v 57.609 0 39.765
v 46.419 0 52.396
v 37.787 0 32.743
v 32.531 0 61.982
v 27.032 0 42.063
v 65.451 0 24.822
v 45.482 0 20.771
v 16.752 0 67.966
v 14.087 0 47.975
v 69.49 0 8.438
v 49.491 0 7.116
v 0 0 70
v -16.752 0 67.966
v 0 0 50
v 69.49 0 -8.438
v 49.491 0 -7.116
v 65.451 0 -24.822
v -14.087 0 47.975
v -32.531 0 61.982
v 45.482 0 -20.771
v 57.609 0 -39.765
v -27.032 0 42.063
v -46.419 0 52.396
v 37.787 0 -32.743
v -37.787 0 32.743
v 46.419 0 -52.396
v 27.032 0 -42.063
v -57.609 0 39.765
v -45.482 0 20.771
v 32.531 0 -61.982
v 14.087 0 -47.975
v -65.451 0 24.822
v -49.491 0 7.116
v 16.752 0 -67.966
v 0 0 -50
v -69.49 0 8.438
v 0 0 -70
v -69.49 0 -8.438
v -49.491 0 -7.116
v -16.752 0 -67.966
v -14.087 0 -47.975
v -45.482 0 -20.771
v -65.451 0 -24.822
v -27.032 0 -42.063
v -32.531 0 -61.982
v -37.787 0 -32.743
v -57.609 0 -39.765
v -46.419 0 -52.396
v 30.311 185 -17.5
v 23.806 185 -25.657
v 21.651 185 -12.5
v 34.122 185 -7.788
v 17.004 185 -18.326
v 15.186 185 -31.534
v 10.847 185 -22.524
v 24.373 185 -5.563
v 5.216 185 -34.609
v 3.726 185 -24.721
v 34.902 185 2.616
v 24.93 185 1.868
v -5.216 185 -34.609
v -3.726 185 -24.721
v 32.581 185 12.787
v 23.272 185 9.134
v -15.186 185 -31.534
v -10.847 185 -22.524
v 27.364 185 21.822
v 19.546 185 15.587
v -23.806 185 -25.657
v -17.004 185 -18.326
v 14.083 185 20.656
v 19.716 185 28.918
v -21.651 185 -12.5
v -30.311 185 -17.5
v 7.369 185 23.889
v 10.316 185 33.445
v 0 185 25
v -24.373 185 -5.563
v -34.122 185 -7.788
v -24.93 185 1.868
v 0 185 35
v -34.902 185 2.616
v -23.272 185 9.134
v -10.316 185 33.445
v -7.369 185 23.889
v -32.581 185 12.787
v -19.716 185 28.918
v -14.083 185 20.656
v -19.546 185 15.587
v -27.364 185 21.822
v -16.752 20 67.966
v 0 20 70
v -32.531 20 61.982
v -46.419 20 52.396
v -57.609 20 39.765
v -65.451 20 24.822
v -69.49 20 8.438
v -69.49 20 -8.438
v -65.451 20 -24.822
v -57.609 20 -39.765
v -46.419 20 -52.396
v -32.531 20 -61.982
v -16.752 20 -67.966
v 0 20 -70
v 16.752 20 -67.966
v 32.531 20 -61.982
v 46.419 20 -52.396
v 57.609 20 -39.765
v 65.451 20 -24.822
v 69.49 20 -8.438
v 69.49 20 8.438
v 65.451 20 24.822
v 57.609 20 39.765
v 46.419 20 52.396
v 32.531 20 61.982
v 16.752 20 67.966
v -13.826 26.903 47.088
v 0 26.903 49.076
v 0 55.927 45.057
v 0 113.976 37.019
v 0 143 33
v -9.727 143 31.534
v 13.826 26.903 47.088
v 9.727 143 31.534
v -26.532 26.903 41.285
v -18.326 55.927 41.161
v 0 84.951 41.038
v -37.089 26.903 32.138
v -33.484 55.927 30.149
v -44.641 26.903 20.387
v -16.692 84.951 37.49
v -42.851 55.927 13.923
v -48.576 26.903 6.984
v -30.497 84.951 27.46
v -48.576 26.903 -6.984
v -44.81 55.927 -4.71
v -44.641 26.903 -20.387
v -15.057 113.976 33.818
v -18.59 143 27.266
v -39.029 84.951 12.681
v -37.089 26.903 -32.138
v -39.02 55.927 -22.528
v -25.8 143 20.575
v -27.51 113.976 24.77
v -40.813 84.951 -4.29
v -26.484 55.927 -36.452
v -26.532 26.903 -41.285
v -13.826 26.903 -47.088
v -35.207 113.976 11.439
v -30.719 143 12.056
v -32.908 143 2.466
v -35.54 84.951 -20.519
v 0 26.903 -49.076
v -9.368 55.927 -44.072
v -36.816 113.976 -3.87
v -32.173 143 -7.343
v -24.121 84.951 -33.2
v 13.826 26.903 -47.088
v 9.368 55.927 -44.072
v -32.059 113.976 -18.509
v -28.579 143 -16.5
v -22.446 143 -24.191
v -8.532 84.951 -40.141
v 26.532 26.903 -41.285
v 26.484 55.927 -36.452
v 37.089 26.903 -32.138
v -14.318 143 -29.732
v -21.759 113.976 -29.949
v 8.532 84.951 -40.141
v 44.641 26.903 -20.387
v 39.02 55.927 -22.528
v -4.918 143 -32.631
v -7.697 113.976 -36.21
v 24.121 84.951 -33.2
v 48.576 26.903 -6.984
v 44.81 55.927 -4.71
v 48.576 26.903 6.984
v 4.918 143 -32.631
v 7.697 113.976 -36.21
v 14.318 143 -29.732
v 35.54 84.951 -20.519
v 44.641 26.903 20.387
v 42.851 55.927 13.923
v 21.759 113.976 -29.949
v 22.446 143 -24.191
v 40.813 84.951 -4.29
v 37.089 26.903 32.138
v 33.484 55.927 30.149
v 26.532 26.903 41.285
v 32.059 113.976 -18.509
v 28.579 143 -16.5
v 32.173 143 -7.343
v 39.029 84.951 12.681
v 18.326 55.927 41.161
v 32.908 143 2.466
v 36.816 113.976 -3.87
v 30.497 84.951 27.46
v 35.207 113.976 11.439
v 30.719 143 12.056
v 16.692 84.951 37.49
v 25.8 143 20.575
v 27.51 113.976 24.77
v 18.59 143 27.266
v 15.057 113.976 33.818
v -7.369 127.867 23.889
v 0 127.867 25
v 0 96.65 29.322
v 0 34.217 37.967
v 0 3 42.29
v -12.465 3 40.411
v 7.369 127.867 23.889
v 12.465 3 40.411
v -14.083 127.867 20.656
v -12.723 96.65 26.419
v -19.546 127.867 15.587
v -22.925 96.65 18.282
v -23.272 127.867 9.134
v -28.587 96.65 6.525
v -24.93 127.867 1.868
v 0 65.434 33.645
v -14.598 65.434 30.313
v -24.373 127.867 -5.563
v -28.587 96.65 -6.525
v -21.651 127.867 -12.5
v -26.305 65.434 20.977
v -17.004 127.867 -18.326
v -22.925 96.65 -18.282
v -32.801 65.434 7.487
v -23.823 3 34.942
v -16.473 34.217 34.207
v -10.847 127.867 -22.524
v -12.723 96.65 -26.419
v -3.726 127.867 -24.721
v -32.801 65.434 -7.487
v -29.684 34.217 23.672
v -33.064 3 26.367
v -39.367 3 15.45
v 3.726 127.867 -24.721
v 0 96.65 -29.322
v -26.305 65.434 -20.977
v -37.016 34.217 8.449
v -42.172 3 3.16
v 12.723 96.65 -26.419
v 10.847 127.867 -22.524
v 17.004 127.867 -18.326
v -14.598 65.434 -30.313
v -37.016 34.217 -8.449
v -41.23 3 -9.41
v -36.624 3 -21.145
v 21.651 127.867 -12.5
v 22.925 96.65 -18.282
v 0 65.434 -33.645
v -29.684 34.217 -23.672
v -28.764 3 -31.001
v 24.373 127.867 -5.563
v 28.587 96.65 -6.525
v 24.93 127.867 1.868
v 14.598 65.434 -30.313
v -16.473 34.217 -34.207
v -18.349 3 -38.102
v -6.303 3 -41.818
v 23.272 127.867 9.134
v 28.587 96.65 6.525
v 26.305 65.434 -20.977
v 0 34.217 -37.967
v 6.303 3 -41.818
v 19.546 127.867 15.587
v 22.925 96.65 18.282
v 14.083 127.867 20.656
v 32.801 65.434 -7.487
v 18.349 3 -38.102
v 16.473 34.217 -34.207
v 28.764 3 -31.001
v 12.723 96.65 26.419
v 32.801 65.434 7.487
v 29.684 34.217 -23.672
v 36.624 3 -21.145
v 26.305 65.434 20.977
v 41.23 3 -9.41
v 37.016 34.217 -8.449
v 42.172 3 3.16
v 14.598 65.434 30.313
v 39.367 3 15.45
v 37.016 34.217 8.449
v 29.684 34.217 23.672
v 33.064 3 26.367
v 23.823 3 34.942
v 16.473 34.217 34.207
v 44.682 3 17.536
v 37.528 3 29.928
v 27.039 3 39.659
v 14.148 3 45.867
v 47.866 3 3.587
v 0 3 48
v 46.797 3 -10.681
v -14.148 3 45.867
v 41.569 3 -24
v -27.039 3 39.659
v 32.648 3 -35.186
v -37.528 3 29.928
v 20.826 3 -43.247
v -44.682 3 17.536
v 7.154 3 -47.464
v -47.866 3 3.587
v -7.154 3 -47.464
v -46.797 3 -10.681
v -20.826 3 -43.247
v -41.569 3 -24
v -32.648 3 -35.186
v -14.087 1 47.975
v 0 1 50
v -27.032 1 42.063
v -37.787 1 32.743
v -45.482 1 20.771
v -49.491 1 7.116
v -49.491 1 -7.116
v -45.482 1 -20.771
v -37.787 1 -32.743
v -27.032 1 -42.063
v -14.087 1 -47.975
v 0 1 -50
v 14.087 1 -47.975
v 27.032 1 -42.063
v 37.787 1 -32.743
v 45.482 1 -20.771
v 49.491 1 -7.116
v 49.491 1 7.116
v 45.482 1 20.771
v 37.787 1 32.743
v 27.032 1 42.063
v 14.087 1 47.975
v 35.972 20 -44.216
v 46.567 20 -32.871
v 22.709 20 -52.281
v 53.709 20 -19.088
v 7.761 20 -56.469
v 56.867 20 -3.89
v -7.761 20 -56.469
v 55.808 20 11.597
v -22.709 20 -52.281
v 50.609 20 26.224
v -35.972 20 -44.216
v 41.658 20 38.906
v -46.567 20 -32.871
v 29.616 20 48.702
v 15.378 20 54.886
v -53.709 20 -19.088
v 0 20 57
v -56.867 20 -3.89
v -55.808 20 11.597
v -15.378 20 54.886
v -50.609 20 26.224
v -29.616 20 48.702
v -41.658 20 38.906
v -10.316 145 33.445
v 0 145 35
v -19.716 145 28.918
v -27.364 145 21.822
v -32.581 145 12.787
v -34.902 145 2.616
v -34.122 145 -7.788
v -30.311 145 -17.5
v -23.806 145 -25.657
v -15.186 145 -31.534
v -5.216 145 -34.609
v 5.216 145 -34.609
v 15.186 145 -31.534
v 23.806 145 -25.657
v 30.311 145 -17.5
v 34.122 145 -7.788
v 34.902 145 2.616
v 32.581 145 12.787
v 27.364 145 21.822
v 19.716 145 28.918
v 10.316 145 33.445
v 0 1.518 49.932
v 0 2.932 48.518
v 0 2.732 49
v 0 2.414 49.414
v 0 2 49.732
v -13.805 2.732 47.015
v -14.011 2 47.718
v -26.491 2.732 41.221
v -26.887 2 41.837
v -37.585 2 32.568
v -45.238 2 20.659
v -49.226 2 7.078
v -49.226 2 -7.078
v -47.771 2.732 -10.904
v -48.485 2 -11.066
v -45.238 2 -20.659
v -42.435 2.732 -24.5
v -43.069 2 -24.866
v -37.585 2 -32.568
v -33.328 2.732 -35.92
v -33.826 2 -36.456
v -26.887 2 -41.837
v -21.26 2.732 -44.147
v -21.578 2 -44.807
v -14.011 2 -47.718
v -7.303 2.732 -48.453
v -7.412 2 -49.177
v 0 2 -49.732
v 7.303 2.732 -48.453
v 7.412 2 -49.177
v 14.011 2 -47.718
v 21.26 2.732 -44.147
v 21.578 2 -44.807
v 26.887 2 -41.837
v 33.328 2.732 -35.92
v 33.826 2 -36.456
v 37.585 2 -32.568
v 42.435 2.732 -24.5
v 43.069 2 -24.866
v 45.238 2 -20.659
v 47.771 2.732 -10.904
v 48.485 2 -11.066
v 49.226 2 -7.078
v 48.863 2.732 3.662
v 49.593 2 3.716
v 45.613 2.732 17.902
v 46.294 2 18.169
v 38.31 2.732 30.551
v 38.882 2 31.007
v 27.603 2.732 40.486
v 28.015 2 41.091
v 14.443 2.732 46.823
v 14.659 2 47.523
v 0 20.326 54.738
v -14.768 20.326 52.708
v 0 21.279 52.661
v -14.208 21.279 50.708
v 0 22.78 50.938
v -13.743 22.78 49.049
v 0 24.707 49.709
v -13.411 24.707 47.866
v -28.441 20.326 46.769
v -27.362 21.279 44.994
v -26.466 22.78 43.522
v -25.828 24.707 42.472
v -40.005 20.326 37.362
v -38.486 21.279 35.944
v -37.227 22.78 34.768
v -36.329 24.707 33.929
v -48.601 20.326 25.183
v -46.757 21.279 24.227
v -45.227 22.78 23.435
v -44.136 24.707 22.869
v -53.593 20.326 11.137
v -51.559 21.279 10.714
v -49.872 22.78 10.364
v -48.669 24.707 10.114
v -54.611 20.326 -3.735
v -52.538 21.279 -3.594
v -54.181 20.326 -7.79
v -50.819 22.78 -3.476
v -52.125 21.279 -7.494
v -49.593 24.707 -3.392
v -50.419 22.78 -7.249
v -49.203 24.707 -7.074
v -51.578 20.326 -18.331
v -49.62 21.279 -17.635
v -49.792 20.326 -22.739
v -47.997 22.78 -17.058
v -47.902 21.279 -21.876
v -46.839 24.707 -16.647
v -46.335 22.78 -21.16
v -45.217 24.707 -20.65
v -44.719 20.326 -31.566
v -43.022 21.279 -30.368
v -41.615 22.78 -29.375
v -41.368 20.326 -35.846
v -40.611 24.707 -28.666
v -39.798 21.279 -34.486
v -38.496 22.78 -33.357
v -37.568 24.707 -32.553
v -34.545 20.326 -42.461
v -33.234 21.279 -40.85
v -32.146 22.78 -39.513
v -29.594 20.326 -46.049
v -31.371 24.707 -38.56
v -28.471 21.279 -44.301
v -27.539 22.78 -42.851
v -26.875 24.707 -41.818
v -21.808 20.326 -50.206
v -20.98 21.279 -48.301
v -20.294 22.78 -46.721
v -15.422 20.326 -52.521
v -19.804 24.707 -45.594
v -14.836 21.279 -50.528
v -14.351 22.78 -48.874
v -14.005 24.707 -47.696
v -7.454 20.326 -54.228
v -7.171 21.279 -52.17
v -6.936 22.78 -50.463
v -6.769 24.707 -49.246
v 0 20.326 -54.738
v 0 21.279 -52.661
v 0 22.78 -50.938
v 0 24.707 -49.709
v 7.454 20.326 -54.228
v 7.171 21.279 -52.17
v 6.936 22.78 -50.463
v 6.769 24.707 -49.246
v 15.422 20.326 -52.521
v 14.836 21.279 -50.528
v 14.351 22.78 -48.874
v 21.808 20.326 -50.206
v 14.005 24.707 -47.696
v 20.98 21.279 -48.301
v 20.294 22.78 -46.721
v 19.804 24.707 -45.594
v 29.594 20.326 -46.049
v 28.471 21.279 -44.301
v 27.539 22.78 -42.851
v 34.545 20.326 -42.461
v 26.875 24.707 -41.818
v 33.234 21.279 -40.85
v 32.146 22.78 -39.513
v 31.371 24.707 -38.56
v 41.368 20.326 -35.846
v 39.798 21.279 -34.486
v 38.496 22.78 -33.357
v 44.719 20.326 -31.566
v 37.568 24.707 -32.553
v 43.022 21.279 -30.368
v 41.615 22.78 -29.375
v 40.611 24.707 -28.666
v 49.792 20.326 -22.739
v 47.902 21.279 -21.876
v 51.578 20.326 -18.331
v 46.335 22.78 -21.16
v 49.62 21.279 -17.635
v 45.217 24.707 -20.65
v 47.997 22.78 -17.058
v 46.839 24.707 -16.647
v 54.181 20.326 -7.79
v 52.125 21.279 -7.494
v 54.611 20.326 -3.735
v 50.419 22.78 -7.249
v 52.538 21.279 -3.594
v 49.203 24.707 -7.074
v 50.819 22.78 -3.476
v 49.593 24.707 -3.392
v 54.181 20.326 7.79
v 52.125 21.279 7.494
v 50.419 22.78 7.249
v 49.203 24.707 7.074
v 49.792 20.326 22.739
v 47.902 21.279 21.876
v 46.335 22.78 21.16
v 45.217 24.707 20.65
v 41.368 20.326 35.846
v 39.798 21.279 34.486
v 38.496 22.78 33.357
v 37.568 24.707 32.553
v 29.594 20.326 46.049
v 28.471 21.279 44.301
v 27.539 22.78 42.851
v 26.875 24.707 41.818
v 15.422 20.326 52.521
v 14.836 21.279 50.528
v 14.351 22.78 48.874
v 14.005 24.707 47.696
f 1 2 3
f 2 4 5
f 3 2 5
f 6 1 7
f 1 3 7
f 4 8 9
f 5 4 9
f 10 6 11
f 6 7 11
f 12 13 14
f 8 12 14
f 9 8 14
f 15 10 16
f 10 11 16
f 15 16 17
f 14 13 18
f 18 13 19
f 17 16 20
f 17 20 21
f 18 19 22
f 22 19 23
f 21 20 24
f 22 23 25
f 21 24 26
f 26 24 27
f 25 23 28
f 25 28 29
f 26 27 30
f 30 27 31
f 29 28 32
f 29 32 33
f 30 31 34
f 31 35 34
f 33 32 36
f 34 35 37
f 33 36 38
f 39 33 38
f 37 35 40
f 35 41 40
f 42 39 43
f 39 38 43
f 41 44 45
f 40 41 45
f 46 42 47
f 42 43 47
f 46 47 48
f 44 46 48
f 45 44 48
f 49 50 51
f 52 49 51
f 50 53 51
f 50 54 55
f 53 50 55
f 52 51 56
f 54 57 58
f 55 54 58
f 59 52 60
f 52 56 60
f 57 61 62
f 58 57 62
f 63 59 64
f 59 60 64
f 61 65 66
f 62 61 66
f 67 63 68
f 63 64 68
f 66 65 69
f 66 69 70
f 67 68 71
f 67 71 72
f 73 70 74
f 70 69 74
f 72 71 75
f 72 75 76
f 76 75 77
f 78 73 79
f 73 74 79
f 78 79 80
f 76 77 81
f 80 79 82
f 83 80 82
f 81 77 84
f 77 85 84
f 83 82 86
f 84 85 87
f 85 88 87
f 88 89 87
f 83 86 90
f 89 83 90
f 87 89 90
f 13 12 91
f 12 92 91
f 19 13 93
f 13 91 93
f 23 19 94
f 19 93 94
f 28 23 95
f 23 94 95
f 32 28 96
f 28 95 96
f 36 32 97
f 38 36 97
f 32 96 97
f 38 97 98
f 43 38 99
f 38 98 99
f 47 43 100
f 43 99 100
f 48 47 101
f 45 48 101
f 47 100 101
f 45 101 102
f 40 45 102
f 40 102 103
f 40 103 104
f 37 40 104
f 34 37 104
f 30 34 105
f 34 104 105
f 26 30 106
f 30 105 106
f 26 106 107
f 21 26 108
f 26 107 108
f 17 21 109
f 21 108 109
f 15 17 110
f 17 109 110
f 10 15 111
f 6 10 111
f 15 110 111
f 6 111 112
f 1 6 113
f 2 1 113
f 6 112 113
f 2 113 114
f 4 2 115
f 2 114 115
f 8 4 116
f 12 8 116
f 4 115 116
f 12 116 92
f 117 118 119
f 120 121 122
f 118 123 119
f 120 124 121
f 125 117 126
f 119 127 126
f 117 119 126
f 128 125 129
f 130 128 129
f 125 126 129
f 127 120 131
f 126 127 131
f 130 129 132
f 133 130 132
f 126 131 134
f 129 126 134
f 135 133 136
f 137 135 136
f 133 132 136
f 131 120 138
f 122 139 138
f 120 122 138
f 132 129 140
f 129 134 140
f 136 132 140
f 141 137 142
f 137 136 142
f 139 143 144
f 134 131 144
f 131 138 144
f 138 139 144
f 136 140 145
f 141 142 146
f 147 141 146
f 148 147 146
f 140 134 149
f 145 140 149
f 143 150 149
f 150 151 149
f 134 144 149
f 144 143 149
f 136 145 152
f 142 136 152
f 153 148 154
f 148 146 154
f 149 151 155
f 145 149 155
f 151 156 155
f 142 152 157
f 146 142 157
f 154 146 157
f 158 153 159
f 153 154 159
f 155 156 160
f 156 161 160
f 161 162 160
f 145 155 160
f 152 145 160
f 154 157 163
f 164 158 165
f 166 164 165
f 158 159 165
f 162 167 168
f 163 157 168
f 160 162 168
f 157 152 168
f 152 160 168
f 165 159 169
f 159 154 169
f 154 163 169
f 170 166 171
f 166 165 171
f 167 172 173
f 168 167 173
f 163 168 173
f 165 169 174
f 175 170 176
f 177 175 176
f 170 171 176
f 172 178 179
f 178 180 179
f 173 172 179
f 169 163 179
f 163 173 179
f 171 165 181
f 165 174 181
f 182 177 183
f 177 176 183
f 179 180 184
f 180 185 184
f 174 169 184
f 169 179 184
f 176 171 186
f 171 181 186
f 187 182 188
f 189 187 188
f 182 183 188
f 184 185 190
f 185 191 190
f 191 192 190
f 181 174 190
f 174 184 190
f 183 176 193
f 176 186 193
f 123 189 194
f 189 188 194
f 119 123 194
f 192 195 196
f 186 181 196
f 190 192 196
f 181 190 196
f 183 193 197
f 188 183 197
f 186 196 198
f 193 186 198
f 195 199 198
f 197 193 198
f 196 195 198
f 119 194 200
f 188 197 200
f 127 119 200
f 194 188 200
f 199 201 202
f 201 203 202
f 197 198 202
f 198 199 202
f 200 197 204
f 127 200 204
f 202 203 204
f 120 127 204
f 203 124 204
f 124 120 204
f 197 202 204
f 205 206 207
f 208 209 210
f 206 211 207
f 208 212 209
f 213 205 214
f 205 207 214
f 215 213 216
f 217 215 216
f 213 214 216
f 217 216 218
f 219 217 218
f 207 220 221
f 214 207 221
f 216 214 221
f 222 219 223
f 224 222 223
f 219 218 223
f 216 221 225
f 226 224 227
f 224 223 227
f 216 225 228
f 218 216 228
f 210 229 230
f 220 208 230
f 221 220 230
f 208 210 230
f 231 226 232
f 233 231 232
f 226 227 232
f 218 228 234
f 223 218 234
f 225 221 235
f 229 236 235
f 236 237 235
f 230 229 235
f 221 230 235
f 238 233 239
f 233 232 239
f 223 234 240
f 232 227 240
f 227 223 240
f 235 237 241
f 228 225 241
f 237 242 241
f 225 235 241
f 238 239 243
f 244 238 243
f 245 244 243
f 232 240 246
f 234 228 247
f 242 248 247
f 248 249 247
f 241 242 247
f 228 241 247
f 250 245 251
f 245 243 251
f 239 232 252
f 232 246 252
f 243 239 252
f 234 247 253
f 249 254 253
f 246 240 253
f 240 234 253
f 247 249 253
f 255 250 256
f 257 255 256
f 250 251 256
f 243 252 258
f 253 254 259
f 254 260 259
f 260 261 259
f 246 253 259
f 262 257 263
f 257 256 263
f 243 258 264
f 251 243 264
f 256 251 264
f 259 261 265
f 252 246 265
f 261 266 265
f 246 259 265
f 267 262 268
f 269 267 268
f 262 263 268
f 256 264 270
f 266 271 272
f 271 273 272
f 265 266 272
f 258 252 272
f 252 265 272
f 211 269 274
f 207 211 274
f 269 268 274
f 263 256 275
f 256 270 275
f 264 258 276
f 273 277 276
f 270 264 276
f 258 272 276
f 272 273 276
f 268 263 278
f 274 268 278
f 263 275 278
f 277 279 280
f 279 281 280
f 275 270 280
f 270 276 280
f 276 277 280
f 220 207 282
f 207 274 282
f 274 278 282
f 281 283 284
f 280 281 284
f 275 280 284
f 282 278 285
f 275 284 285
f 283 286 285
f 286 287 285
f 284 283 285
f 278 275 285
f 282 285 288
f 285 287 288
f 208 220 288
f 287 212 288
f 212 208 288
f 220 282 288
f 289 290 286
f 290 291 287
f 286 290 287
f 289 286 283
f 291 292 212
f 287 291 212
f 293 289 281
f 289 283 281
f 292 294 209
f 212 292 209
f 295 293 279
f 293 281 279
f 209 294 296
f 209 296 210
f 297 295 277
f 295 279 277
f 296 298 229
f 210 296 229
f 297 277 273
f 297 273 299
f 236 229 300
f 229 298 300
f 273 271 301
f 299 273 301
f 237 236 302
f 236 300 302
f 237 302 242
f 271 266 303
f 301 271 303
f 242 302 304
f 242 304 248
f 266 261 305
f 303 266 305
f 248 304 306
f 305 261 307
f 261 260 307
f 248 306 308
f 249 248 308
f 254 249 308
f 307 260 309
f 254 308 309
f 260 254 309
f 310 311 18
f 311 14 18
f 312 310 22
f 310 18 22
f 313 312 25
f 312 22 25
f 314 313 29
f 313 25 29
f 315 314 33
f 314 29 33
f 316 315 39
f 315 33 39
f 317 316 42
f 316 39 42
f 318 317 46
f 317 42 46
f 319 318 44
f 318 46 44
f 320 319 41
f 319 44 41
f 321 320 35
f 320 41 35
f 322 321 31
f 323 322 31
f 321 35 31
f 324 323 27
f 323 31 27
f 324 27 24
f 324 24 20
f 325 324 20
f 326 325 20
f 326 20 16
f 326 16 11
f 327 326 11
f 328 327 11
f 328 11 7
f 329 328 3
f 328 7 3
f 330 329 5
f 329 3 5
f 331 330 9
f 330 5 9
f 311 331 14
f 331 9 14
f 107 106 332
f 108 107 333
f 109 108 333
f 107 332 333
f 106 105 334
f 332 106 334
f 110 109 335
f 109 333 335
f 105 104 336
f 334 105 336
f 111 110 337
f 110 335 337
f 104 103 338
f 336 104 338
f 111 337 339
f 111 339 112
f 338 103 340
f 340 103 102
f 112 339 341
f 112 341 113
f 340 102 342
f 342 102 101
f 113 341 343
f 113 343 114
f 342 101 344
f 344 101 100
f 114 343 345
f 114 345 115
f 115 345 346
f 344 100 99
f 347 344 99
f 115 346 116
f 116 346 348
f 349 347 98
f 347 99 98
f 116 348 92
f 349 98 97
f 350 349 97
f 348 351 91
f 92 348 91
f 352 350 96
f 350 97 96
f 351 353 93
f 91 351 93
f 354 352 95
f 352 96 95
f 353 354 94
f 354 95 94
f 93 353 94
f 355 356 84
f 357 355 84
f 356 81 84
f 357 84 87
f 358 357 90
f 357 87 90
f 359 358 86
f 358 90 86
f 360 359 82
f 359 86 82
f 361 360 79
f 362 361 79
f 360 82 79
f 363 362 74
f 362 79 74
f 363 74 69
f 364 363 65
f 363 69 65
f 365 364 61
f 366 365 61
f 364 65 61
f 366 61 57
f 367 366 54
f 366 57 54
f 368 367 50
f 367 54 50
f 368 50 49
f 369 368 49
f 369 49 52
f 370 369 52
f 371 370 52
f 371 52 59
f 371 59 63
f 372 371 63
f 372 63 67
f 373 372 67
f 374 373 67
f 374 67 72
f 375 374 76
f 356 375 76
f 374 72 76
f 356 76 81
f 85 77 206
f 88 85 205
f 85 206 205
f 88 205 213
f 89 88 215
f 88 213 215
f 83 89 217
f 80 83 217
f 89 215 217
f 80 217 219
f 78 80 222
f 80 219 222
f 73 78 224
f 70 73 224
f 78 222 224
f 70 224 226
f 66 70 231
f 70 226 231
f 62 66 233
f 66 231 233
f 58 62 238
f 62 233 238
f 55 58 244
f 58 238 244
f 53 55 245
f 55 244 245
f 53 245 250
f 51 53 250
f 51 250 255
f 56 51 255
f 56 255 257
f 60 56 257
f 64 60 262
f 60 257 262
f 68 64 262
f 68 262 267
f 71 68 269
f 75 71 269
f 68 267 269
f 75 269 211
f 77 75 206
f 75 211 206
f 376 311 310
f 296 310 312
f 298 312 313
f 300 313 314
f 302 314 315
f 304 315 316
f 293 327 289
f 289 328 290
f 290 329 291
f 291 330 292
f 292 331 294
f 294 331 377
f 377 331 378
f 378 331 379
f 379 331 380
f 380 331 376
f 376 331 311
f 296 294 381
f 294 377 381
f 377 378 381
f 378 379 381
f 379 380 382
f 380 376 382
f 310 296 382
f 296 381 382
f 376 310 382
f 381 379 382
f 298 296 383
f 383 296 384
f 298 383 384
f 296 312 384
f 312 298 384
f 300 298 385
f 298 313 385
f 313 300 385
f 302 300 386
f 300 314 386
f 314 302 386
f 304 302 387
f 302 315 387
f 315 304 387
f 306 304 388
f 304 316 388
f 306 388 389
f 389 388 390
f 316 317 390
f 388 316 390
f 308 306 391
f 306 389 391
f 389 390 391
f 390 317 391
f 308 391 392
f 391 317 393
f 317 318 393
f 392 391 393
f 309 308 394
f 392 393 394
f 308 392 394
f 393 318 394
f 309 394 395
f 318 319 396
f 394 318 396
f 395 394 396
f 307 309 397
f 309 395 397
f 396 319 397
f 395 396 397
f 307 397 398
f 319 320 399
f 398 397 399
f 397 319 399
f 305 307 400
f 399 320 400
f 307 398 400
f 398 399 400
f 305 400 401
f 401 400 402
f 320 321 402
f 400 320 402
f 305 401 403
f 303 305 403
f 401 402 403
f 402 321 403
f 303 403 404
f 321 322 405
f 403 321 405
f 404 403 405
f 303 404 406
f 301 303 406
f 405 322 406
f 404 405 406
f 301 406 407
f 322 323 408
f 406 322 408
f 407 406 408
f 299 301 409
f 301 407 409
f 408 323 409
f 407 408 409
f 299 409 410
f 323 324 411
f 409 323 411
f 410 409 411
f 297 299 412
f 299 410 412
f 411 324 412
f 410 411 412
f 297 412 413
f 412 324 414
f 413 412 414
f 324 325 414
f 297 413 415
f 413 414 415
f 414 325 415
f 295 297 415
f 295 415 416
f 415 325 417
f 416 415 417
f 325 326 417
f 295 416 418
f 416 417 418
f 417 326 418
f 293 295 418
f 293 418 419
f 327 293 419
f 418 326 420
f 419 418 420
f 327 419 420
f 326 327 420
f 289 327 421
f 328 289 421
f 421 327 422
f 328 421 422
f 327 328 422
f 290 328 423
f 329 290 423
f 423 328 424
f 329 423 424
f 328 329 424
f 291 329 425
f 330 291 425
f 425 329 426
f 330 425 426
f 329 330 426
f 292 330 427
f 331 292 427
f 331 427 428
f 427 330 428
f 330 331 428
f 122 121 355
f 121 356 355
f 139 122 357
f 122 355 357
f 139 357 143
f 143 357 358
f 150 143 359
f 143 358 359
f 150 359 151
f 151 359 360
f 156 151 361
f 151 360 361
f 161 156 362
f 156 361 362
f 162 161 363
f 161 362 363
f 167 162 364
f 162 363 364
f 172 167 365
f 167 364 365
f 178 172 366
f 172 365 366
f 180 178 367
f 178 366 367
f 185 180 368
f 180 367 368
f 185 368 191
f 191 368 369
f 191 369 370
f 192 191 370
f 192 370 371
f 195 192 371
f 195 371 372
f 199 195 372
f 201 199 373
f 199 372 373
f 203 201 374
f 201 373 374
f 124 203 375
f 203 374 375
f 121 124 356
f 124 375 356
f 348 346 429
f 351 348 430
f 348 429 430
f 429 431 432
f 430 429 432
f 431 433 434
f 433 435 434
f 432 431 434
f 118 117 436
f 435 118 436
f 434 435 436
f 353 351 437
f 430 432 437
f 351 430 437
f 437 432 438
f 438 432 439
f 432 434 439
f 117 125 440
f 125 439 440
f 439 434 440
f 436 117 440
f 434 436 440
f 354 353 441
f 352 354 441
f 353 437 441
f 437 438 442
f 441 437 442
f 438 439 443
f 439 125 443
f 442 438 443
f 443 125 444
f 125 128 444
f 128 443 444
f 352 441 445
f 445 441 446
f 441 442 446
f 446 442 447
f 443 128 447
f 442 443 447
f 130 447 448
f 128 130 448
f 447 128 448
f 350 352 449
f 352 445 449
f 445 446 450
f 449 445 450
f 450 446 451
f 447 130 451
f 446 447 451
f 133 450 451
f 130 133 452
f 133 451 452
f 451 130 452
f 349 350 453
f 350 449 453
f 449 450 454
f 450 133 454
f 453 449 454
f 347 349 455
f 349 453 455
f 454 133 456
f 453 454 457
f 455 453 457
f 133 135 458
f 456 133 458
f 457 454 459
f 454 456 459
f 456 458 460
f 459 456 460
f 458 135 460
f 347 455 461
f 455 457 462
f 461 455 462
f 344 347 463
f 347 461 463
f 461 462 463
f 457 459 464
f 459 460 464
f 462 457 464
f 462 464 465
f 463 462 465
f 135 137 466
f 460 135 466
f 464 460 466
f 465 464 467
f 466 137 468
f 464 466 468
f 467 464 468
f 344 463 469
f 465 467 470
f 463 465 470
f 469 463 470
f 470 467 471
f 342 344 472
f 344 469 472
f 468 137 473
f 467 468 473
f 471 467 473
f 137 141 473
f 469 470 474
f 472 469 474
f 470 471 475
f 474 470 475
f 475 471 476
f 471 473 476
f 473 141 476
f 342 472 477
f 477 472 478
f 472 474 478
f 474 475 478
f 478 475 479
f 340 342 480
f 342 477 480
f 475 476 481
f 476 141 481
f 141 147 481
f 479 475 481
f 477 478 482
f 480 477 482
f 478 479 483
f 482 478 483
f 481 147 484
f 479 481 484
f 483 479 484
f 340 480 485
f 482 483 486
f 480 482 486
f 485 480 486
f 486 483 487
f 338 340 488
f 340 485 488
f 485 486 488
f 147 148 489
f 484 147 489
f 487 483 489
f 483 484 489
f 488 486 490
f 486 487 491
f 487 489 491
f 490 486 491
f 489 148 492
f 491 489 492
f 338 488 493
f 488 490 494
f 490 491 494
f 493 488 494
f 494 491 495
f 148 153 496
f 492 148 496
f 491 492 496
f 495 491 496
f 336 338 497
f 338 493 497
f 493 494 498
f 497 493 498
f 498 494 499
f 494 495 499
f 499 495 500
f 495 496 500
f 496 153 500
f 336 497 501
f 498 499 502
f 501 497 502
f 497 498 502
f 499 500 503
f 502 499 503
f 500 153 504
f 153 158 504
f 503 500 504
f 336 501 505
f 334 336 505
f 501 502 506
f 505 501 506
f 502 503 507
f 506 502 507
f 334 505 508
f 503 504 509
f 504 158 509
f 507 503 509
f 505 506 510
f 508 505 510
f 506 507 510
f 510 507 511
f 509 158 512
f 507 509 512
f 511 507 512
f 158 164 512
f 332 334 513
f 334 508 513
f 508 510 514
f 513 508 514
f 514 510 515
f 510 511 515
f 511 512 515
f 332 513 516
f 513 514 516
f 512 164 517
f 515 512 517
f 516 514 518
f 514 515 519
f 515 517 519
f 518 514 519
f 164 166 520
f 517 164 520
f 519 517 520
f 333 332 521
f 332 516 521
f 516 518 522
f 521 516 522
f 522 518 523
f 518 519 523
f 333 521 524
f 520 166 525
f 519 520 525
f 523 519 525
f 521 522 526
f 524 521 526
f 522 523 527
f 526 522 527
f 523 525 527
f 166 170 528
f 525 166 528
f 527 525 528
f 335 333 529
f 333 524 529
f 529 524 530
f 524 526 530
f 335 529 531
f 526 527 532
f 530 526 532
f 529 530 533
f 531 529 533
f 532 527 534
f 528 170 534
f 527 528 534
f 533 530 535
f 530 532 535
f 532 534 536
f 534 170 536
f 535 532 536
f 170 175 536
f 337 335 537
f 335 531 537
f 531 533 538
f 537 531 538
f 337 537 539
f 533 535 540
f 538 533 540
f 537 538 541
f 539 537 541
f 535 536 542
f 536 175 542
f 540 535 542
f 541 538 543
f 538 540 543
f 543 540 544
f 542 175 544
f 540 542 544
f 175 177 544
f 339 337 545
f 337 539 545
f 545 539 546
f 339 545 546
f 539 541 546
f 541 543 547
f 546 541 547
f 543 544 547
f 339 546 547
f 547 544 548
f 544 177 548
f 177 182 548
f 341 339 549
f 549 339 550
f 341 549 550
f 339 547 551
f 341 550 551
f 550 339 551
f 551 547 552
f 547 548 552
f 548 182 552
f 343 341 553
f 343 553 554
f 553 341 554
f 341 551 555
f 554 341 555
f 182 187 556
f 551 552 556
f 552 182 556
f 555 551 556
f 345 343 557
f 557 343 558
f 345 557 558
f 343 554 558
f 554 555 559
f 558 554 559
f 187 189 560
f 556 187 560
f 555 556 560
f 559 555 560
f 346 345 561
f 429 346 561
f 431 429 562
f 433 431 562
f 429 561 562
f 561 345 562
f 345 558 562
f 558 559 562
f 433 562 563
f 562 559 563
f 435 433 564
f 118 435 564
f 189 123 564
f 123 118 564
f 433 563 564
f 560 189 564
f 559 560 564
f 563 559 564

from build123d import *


with BuildPart() as part:
    # Sketch1 → Revolve1 (revolve)
    with BuildSketch(Plane.XY, mode=Mode.PRIVATE) as revolve1_sk:
        with BuildLine():
            Line((70, 0), (70, 20))
            Line((70, 20), (57, 20))
            ThreePointArc((57, 20), (51.745388578, 21.967665559), (49.075606637, 26.902735298))
            Line((49.075606637, 26.902735298), (33, 143))
            Line((33, 143), (35, 145))
            Line((35, 145), (35, 185))
            Line((35, 185), (25, 185))
            Line((25, 185), (25, 127.867048884))
            Line((25, 127.867048884), (42.289929827, 3))
            Line((42.289929827, 3), (48, 3))
            ThreePointArc((48, 3), (49.414213562, 2.414213562), (50, 1))
            Line((50, 1), (50, 0))
            Line((50, 0), (70, 0))
        make_face()
    revolve(revolve1_sk.sketch.rotate(Axis((0, 99.490022173, 0), (0, -1, 0)), 90), axis=Axis((0, 99.490022173, 0), (0, -1, 0)))


solid = part.part
